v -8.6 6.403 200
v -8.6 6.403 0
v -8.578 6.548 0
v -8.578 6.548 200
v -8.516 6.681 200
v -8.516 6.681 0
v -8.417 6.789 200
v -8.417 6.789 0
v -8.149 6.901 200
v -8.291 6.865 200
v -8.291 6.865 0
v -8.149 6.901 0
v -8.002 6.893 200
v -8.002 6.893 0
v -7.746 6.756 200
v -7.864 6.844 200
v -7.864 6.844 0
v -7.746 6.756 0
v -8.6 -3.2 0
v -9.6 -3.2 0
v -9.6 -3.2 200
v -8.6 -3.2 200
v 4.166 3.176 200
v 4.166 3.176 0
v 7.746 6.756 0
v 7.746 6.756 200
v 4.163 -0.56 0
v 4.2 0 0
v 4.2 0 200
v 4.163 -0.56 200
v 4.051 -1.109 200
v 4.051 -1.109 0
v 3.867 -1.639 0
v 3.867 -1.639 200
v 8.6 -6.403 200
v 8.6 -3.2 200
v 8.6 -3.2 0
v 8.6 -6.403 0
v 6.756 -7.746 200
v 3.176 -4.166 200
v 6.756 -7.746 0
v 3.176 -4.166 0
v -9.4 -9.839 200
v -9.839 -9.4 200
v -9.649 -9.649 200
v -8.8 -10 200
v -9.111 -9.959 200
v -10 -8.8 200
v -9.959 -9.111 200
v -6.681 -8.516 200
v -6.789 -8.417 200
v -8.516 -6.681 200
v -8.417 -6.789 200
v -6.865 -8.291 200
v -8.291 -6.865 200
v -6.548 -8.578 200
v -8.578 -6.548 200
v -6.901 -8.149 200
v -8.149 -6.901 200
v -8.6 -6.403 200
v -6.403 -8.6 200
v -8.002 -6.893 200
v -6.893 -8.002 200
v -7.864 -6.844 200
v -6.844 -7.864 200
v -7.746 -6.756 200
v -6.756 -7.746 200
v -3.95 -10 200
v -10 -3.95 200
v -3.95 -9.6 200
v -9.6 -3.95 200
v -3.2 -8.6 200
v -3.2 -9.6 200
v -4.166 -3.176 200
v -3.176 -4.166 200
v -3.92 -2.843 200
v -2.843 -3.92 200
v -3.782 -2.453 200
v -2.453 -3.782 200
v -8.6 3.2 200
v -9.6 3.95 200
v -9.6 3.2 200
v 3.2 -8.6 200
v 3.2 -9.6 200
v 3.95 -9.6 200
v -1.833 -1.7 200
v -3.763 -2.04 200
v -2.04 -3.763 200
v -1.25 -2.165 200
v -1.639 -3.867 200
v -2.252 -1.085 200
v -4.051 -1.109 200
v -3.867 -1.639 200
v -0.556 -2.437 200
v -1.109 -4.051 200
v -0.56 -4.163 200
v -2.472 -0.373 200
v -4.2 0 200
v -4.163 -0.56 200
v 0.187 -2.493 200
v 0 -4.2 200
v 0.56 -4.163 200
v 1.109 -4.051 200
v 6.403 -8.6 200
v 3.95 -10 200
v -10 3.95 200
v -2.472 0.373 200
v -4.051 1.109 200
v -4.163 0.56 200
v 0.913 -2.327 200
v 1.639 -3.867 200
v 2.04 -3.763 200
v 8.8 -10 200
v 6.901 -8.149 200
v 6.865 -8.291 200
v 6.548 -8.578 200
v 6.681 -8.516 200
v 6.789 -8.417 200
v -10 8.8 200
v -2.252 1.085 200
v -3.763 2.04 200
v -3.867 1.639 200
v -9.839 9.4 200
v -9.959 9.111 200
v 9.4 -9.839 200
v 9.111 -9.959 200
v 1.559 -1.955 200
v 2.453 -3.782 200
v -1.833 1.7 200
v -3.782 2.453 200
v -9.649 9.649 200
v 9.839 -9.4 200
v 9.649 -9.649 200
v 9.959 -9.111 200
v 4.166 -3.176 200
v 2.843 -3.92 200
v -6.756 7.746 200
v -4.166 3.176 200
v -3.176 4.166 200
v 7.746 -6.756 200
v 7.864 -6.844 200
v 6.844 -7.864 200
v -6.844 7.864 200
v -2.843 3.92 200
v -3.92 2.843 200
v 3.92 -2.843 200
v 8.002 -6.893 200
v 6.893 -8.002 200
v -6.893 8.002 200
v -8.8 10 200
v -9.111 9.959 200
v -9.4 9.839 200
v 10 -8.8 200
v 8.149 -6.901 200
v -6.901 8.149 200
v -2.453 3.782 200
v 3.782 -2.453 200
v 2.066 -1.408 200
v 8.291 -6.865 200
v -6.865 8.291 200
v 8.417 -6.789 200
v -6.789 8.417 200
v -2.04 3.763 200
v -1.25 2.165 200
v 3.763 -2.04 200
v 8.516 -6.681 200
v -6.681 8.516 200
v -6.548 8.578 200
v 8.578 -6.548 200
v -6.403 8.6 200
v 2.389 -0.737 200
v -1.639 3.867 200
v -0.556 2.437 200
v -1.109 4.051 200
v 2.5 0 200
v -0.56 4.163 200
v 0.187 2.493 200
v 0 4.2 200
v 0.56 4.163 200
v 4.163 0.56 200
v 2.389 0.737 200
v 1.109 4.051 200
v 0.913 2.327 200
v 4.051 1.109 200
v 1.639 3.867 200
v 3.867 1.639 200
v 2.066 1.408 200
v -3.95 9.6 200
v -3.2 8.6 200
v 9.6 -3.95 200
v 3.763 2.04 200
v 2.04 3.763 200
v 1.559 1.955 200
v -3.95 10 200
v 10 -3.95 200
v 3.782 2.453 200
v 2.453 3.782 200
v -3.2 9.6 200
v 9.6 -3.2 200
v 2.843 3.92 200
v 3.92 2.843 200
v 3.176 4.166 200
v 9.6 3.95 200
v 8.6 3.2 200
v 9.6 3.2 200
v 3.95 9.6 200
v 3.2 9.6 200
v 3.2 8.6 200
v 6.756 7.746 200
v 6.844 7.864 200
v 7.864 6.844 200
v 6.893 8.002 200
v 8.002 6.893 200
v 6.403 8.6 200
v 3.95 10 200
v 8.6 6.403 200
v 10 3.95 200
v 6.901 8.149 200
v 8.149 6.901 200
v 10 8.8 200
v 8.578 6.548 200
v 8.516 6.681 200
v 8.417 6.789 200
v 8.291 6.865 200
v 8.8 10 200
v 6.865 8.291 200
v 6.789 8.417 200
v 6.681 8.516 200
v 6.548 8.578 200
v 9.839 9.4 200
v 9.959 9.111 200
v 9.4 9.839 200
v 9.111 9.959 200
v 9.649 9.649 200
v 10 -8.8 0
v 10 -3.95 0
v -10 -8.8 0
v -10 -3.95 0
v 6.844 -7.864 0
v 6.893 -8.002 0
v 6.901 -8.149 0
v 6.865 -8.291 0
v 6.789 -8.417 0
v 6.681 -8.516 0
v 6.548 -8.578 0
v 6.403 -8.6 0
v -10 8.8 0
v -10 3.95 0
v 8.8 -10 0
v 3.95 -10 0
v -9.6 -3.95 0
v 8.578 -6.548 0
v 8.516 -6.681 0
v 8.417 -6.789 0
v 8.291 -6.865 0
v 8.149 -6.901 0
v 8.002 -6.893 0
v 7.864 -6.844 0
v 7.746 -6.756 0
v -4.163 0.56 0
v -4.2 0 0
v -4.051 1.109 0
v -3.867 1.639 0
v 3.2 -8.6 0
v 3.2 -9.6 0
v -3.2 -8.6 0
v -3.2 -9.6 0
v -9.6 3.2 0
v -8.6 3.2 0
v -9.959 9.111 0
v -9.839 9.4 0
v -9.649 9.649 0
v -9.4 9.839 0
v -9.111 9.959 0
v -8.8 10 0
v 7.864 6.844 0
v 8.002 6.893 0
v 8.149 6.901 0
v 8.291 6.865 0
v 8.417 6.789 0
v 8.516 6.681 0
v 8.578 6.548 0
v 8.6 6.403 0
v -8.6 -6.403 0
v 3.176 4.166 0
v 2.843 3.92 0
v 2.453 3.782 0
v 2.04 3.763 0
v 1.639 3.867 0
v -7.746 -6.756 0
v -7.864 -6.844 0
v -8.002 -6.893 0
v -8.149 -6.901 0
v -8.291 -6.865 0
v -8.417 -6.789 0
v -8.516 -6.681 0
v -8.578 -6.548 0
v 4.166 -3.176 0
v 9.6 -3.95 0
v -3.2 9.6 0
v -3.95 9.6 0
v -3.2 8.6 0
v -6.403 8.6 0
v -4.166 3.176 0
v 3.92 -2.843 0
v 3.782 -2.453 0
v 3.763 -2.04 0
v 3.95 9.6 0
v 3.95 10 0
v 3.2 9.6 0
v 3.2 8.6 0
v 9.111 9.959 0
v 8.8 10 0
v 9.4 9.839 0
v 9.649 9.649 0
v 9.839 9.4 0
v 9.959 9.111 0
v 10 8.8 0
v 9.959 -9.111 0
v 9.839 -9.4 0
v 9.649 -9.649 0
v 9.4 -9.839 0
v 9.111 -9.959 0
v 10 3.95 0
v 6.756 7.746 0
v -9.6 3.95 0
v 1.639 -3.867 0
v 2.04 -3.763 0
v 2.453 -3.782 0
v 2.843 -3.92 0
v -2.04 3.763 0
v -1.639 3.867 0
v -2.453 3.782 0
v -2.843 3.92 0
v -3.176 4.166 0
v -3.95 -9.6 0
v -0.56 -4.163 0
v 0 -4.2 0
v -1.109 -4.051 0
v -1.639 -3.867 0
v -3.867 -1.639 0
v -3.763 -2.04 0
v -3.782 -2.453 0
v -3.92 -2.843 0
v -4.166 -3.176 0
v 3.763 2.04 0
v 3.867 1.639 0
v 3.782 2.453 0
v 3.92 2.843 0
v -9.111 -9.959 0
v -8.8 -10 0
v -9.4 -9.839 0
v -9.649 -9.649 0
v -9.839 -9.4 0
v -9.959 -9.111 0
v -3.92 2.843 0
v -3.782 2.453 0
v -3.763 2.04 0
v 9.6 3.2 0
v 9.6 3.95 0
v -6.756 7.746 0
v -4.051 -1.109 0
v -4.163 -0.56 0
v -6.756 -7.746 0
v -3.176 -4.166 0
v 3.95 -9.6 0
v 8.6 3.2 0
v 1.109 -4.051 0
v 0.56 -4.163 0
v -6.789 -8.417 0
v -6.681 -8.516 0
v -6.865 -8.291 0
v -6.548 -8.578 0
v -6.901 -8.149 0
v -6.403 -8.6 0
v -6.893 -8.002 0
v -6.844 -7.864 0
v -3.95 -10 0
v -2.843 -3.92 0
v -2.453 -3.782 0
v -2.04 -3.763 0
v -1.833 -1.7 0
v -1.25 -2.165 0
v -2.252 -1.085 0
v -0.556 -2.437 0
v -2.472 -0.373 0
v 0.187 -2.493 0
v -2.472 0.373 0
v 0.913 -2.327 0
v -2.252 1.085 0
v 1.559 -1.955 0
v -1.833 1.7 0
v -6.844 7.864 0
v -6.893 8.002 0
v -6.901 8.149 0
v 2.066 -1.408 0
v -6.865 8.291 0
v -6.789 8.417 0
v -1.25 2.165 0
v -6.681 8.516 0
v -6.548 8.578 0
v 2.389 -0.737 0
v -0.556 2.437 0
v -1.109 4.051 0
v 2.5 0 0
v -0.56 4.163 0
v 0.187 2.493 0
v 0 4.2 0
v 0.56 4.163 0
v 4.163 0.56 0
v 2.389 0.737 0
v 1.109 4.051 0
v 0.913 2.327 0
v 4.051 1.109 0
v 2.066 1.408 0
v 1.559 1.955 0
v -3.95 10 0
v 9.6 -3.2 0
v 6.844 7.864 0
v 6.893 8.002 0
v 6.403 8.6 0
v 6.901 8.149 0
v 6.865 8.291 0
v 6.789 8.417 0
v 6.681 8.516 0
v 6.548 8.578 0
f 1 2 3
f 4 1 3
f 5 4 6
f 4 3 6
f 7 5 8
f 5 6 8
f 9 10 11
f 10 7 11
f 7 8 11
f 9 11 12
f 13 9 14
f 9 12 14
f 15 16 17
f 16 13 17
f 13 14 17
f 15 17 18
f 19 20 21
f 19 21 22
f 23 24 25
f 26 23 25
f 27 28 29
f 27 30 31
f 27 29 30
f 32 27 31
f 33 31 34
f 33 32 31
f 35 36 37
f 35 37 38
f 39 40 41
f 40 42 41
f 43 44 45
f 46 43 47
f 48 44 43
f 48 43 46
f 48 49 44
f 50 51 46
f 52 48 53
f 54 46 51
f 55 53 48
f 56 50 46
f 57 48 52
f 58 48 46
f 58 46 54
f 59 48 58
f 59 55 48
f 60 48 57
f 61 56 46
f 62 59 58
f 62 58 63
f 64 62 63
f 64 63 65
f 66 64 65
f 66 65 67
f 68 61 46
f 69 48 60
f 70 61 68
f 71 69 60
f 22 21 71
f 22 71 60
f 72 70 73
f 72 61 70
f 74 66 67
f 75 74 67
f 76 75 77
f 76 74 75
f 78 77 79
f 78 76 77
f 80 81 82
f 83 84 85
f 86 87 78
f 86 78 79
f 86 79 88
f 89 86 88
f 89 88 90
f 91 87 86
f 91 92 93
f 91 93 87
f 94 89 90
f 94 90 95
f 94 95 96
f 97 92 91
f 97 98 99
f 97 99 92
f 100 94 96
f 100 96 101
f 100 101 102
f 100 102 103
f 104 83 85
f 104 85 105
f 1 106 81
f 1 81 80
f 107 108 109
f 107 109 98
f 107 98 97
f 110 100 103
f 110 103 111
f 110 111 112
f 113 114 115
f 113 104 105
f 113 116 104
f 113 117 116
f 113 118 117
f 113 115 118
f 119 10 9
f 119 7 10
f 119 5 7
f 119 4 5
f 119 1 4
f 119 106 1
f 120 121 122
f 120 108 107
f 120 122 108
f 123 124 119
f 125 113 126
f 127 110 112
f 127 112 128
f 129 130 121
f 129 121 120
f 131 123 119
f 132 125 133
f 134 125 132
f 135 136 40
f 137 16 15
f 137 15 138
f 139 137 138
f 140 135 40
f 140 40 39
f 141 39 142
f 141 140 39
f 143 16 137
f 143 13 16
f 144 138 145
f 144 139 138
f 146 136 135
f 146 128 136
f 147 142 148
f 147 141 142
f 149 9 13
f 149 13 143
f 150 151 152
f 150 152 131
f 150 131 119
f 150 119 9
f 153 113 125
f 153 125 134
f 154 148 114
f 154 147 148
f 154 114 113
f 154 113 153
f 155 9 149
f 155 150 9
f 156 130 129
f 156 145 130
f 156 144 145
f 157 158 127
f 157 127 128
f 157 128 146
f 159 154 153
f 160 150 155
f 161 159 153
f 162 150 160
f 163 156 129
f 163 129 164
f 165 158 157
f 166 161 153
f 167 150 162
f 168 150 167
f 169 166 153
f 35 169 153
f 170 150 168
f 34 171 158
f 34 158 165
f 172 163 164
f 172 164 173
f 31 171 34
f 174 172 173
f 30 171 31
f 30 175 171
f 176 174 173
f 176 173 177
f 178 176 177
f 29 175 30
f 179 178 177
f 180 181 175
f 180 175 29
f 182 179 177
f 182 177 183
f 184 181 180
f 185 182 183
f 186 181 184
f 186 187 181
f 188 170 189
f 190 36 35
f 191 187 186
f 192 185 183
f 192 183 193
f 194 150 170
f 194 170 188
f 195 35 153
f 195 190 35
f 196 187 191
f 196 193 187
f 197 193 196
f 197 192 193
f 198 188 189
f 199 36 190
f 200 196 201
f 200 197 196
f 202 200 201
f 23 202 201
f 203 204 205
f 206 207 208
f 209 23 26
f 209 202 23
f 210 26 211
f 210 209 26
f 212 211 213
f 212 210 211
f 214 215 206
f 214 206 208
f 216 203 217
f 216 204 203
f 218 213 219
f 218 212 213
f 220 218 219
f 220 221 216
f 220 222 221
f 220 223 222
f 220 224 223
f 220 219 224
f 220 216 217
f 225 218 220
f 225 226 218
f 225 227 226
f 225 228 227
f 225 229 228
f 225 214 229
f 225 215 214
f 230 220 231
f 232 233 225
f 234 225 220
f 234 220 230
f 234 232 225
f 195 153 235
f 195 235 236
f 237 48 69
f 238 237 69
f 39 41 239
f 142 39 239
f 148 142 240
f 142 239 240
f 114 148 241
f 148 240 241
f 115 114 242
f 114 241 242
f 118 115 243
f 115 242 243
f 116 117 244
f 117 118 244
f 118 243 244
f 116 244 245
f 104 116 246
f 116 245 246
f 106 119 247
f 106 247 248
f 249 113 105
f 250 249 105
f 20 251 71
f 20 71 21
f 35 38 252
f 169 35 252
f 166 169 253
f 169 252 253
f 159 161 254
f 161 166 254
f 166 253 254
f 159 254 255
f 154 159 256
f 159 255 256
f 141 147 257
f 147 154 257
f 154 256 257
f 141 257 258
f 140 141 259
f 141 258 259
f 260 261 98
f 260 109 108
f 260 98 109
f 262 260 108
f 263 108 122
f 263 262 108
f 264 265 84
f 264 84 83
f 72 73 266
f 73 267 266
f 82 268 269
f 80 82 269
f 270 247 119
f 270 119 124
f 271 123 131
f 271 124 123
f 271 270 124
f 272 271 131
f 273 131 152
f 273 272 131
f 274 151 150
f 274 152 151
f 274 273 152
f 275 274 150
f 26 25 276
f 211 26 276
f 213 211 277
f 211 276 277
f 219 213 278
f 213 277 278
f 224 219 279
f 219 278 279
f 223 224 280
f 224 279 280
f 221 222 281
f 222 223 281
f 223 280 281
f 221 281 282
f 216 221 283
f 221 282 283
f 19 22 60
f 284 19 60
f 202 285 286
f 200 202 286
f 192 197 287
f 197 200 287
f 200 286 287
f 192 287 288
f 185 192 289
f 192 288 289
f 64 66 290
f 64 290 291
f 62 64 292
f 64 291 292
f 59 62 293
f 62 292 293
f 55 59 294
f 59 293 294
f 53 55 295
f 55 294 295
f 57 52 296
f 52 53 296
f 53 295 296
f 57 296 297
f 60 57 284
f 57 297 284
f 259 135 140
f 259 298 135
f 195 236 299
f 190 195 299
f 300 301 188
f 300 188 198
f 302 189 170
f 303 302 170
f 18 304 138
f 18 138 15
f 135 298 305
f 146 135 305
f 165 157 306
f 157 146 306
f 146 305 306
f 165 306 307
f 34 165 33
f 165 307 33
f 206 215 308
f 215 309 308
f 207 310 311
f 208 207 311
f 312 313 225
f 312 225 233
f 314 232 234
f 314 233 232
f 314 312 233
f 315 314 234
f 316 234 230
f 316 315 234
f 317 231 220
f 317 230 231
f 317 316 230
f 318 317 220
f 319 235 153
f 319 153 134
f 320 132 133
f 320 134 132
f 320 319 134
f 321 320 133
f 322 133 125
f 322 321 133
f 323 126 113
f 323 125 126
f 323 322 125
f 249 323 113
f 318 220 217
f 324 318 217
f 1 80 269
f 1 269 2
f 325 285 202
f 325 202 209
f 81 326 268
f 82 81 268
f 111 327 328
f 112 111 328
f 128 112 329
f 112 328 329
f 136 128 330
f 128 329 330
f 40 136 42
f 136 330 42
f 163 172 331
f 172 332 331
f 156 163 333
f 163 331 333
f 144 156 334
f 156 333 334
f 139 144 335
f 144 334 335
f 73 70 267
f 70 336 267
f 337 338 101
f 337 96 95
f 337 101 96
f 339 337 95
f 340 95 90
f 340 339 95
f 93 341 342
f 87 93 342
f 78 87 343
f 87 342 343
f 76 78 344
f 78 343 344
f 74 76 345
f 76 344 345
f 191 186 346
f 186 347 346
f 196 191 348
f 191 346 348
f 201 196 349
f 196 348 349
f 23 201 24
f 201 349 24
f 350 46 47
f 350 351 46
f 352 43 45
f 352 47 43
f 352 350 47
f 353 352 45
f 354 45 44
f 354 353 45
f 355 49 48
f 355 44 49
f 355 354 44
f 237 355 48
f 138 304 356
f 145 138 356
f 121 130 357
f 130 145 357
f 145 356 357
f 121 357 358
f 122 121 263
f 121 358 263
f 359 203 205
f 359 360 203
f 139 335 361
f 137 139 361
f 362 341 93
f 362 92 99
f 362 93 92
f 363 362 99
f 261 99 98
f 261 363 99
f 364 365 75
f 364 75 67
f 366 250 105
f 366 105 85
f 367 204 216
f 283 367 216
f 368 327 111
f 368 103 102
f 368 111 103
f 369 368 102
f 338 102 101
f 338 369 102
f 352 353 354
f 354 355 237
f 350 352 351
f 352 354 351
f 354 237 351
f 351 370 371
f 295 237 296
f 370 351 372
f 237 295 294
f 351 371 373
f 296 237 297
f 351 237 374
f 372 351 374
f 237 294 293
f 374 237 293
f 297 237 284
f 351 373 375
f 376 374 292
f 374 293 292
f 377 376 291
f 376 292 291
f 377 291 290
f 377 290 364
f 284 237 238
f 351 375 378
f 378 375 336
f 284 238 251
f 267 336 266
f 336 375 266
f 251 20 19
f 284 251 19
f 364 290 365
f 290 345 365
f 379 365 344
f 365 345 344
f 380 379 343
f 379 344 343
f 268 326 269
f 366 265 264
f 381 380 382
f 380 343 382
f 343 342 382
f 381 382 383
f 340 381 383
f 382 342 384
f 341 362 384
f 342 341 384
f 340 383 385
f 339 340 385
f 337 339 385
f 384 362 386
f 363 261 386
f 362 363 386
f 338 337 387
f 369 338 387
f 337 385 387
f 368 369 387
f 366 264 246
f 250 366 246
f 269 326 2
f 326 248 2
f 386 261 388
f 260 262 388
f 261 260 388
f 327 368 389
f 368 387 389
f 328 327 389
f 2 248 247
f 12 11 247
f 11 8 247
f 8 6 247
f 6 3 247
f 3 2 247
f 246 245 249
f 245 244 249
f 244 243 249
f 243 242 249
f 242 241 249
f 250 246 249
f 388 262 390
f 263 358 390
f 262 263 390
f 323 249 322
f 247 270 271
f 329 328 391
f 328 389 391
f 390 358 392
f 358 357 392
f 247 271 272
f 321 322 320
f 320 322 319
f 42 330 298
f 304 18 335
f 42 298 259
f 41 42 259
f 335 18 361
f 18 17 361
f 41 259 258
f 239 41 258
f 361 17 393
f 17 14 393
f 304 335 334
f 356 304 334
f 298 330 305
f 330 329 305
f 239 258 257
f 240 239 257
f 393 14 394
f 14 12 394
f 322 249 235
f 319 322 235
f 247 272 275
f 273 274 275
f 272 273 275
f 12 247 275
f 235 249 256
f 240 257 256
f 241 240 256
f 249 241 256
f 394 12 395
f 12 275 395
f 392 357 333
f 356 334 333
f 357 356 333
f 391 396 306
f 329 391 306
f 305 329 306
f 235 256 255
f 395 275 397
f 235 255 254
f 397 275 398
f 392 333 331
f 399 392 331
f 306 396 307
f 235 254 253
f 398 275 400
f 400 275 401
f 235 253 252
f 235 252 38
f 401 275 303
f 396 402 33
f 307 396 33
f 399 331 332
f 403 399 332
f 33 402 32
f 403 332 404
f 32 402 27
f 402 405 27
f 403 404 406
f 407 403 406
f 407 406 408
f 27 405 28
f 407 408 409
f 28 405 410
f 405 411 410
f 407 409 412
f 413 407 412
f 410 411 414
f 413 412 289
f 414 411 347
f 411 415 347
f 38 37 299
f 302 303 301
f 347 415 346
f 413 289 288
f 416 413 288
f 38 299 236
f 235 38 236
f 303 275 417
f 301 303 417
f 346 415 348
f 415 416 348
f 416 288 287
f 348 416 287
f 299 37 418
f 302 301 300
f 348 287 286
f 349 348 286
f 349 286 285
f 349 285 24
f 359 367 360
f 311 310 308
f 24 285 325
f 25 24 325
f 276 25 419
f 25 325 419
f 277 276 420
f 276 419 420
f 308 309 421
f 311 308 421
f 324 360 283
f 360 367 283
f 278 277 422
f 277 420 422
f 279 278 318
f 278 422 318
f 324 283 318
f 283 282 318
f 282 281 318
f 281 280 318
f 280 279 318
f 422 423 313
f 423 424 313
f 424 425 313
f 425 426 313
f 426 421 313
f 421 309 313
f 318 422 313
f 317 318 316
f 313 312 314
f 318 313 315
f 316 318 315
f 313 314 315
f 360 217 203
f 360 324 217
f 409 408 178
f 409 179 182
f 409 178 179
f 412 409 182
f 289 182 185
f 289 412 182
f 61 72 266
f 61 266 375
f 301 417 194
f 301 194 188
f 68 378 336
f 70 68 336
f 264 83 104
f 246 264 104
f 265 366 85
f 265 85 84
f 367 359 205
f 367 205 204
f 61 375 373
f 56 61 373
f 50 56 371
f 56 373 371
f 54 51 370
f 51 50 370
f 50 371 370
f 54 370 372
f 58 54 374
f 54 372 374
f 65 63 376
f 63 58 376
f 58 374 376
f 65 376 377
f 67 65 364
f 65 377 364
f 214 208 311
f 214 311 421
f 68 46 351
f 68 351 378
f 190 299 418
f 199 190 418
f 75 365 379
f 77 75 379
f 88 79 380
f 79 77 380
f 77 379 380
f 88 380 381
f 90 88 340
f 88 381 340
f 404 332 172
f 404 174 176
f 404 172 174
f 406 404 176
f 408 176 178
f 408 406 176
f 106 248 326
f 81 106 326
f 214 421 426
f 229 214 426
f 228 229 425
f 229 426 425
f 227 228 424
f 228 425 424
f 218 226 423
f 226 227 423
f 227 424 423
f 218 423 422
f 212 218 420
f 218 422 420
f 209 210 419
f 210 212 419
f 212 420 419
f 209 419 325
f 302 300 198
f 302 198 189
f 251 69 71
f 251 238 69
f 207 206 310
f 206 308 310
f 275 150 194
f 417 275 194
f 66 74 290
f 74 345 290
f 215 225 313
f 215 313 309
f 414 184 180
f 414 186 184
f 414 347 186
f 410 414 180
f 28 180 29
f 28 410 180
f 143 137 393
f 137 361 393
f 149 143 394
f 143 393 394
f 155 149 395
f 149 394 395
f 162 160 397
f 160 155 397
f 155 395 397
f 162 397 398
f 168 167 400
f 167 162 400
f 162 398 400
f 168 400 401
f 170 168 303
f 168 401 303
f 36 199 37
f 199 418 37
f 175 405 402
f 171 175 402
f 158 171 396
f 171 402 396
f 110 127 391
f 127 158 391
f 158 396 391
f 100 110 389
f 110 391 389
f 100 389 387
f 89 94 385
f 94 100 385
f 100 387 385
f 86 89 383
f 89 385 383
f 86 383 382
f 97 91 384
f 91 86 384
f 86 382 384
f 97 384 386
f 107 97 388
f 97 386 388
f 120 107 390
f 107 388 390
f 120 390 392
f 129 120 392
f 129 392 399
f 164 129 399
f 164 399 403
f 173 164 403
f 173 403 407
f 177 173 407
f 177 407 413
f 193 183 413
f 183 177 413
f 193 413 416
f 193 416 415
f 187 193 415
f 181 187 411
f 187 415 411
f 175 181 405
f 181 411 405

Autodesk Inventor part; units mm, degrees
ref_plane "YZ Plane" through (0, 0, 0) normal (1, 0, 0) x (0, 1, 0)
ref_plane "Start Plane" through (0, 0, 0) normal (0, 0, 1) x (1, 0, 0)
ref_plane "End Plane" through (0, 0, 200) normal (0, 0, 1) x (1, 0, 0)
sketch "Sketch" plane through (0, 0, 0) normal (0, 0, 1) x (1, 0, 0)
  circle A0 centre (0, 0) radius 2.5
  circle A1 centre (0, 0) radius 4.2 construction
  line L0 (10, -10) -> (-10, -10) construction
  line L1 (-10, -10) -> (-10, 10) construction
  line L2 (-10, 10) -> (10, 10) construction
  line L3 (10, 10) -> (10, -10) construction
  line L4 (10, -10) -> (-10, 10) construction
  line L5 (-10, -10) -> (10, 10) construction
  line L6 (-4.1658, 3.1759) -> (-7.7464, 6.7565)
  line L7 (-10, 8.8) -> (-10, 3.95)
  line L8 (-10, 3.95) -> (-9.6, 3.95)
  line L9 (-9.6, 3.95) -> (-9.6, 3.2)
  line L10 (-9.6, 3.2) -> (-8.6, 3.2)
  line L11 (-8.6, 3.2) -> (-8.6, 6.4029)
  line L12 (-10, 0) -> (0, 0) construction
  line L13 (-8.8, 10) -> (-3.95, 10)
  line L14 (-3.95, 10) -> (-3.95, 9.6)
  line L15 (-3.95, 9.6) -> (-3.2, 9.6)
  line L16 (-3.2, 9.6) -> (-3.2, 8.6)
  line L17 (-3.2, 8.6) -> (-6.4029, 8.6)
  arc A2 (-8.8, 10) -> (-10, 8.8) centre (-8.8, 8.8) ccw
  arc A3 (-6.4029, 8.6) -> (-6.7565, 7.7464) centre (-6.4029, 8.1) ccw
  arc A4 (-7.7464, 6.7565) -> (-8.6, 6.4029) centre (-8.1, 6.4029) ccw
  arc A5 (-3.8668, 1.6394) -> (-4.2, 0) centre (0, 0) ccw
  arc A6 (-3.8668, 1.6394) -> (-4.1658, 3.1759) centre (-5.1558, 2.1859) ccw
  line L18 (-3.1759, 4.1658) -> (-6.7565, 7.7464)
  arc A7 (0, 4.2) -> (-1.6394, 3.8668) centre (0, 0) ccw
  arc A8 (-3.1759, 4.1658) -> (-1.6394, 3.8668) centre (-2.1859, 5.1558) ccw
  line L19 (-3.2, -9.6) -> (-3.2, -8.6)
  line L20 (-3.2, -8.6) -> (-6.4029, -8.6)
  line L21 (-8.8, -10) -> (-3.95, -10)
  arc A9 (-1.6394, -3.8668) -> (-3.1759, -4.1658) centre (-2.1859, -5.1558) ccw
  line L22 (-3.1759, -4.1658) -> (-6.7565, -7.7464)
  line L23 (0, -10) -> (0, 0) construction
  arc A10 (-4.1658, -3.1759) -> (-3.8668, -1.6394) centre (-5.1558, -2.1859) ccw
  line L24 (-4.1658, -3.1759) -> (-7.7464, -6.7565)
  line L25 (-3.95, -9.6) -> (-3.2, -9.6)
  line L26 (-3.95, -10) -> (-3.95, -9.6)
  arc A11 (-1.6394, -3.8668) -> (0, -4.2) centre (0, 0) ccw
  arc A12 (-4.2, 0) -> (-3.8668, -1.6394) centre (0, 0) ccw
  line L27 (-9.6, -3.95) -> (-9.6, -3.2)
  arc A13 (-6.7565, -7.7464) -> (-6.4029, -8.6) centre (-6.4029, -8.1) ccw
  arc A14 (-8.6, -6.4029) -> (-7.7464, -6.7565) centre (-8.1, -6.4029) ccw
  line L28 (-8.6, -3.2) -> (-8.6, -6.4029)
  line L29 (-9.6, -3.2) -> (-8.6, -3.2)
  line L30 (-10, -3.95) -> (-9.6, -3.95)
  line L31 (-10, -8.8) -> (-10, -3.95)
  arc A15 (-10, -8.8) -> (-8.8, -10) centre (-8.8, -8.8) ccw
  line L32 (9.6, -3.2) -> (8.6, -3.2)
  line L33 (8.6, -3.2) -> (8.6, -6.4029)
  line L34 (10, -8.8) -> (10, -3.95)
  arc A16 (3.8668, -1.6394) -> (4.1658, -3.1759) centre (5.1558, -2.1859) ccw
  line L35 (4.1658, -3.1759) -> (7.7464, -6.7565)
  line L36 (10, 0) -> (0, 0) construction
  arc A17 (3.1759, -4.1658) -> (1.6394, -3.8668) centre (2.1859, -5.1558) ccw
  line L37 (3.1759, -4.1658) -> (6.7565, -7.7464)
  line L38 (9.6, -3.95) -> (9.6, -3.2)
  line L39 (10, -3.95) -> (9.6, -3.95)
  arc A18 (3.8668, -1.6394) -> (4.2, 0) centre (0, 0) ccw
  arc A19 (0, -4.2) -> (1.6394, -3.8668) centre (0, 0) ccw
  line L40 (3.95, -9.6) -> (3.2, -9.6)
  arc A20 (7.7464, -6.7565) -> (8.6, -6.4029) centre (8.1, -6.4029) ccw
  arc A21 (6.4029, -8.6) -> (6.7565, -7.7464) centre (6.4029, -8.1) ccw
  line L41 (3.2, -8.6) -> (6.4029, -8.6)
  line L42 (3.2, -9.6) -> (3.2, -8.6)
  line L43 (3.95, -10) -> (3.95, -9.6)
  line L44 (8.8, -10) -> (3.95, -10)
  arc A22 (8.8, -10) -> (10, -8.8) centre (8.8, -8.8) ccw
  line L45 (3.2, 9.6) -> (3.2, 8.6)
  line L46 (3.2, 8.6) -> (6.4029, 8.6)
  line L47 (8.8, 10) -> (3.95, 10)
  arc A23 (1.6394, 3.8668) -> (3.1759, 4.1658) centre (2.1859, 5.1558) ccw
  line L48 (3.1759, 4.1658) -> (6.7565, 7.7464)
  line L49 (0, 10) -> (0, 0) construction
  arc A24 (4.1658, 3.1759) -> (3.8668, 1.6394) centre (5.1558, 2.1859) ccw
  line L50 (4.1658, 3.1759) -> (7.7464, 6.7565)
  line L51 (3.95, 9.6) -> (3.2, 9.6)
  line L52 (3.95, 10) -> (3.95, 9.6)
  arc A25 (1.6394, 3.8668) -> (0, 4.2) centre (0, 0) ccw
  arc A26 (4.2, 0) -> (3.8668, 1.6394) centre (0, 0) ccw
  line L53 (9.6, 3.95) -> (9.6, 3.2)
  arc A27 (6.7565, 7.7464) -> (6.4029, 8.6) centre (6.4029, 8.1) ccw
  arc A28 (8.6, 6.4029) -> (7.7464, 6.7565) centre (8.1, 6.4029) ccw
  line L54 (8.6, 3.2) -> (8.6, 6.4029)
  line L55 (9.6, 3.2) -> (8.6, 3.2)
  line L56 (10, 3.95) -> (9.6, 3.95)
  line L57 (10, 8.8) -> (10, 3.95)
  arc A29 (10, 8.8) -> (8.8, 10) centre (8.8, 8.8) ccw
  point P0 (-3.4233, 2.4333)
  point P1 (-8.6, 7.6101)
  point P2 (-7.6101, 8.6)
  point P3 (-7.6101, -8.6)
  point P4 (-10, -10)
  point P5 (-2.4333, -3.4233)
  point P6 (-8.6, -7.6101)
  point P7 (8.6, -7.6101)
  point P8 (10, -10)
  point P9 (3.4233, -2.4333)
  point P10 (7.6101, -8.6)
  point P11 (7.6101, 8.6)
  point P12 (10, 10)
  point P13 (2.4333, 3.4233)
  point P14 (8.6, 7.6101)
  point P15 (-4.2, 0)
  point P16 (0, -4.2)
  point P17 (4.2, 0)
  point P18 (0, 4.2)
  dimension "d8" = 5
  dimension "d9" = 8.4
  dimension "d10" = 20
  dimension "d11" = 20
  dimension "d13" = 1.4
  dimension "d14" = 3.2
  dimension "d15" = 3.95
  dimension "d16" = 0.4
  dimension "d18" = 1.2
  dimension "d19" = 0.5
  dimension "d20" = 1.4
  dimension "d21" = 1.4
  dimension "d24" = 360
extrude "Body" add sketch "Sketch" along normal up to surface (200 mm away) from surface at 0
sketch "Sketch11" plane through (0, 0, 0) normal (0, 0, 1) x (1, 0, 0)
  line L0 (0, 0) -> (10, 0)
ref_plane "Work Plane11" through (0, 0, 0) normal (0, -1, 0) x (1, 0, 0)
sketch "Sketch12" plane through (0, 0, 0) normal (0, -1, 0) x (1, 0, 0)
  line L0 (-2, 0) -> (12, 0)
  line L1 (-2, 200) -> (12, 200)
  dimension "d53" = 200
equation "\"G_OFFSET_START\" = 0"
equation "\"G_OFFSET_END\" = 0"
equation "\"G_L\" = d53"
equation "\"G_OFFSET_START1\" = 0"
equation "\"G_OFFSET_END1\" = 0"
equation "\"G_OFFSET_START2\" = 0"
equation "\"G_OFFSET_END2\" = 0"
properties part number "2020Profile" material "Aluminum 6061"
